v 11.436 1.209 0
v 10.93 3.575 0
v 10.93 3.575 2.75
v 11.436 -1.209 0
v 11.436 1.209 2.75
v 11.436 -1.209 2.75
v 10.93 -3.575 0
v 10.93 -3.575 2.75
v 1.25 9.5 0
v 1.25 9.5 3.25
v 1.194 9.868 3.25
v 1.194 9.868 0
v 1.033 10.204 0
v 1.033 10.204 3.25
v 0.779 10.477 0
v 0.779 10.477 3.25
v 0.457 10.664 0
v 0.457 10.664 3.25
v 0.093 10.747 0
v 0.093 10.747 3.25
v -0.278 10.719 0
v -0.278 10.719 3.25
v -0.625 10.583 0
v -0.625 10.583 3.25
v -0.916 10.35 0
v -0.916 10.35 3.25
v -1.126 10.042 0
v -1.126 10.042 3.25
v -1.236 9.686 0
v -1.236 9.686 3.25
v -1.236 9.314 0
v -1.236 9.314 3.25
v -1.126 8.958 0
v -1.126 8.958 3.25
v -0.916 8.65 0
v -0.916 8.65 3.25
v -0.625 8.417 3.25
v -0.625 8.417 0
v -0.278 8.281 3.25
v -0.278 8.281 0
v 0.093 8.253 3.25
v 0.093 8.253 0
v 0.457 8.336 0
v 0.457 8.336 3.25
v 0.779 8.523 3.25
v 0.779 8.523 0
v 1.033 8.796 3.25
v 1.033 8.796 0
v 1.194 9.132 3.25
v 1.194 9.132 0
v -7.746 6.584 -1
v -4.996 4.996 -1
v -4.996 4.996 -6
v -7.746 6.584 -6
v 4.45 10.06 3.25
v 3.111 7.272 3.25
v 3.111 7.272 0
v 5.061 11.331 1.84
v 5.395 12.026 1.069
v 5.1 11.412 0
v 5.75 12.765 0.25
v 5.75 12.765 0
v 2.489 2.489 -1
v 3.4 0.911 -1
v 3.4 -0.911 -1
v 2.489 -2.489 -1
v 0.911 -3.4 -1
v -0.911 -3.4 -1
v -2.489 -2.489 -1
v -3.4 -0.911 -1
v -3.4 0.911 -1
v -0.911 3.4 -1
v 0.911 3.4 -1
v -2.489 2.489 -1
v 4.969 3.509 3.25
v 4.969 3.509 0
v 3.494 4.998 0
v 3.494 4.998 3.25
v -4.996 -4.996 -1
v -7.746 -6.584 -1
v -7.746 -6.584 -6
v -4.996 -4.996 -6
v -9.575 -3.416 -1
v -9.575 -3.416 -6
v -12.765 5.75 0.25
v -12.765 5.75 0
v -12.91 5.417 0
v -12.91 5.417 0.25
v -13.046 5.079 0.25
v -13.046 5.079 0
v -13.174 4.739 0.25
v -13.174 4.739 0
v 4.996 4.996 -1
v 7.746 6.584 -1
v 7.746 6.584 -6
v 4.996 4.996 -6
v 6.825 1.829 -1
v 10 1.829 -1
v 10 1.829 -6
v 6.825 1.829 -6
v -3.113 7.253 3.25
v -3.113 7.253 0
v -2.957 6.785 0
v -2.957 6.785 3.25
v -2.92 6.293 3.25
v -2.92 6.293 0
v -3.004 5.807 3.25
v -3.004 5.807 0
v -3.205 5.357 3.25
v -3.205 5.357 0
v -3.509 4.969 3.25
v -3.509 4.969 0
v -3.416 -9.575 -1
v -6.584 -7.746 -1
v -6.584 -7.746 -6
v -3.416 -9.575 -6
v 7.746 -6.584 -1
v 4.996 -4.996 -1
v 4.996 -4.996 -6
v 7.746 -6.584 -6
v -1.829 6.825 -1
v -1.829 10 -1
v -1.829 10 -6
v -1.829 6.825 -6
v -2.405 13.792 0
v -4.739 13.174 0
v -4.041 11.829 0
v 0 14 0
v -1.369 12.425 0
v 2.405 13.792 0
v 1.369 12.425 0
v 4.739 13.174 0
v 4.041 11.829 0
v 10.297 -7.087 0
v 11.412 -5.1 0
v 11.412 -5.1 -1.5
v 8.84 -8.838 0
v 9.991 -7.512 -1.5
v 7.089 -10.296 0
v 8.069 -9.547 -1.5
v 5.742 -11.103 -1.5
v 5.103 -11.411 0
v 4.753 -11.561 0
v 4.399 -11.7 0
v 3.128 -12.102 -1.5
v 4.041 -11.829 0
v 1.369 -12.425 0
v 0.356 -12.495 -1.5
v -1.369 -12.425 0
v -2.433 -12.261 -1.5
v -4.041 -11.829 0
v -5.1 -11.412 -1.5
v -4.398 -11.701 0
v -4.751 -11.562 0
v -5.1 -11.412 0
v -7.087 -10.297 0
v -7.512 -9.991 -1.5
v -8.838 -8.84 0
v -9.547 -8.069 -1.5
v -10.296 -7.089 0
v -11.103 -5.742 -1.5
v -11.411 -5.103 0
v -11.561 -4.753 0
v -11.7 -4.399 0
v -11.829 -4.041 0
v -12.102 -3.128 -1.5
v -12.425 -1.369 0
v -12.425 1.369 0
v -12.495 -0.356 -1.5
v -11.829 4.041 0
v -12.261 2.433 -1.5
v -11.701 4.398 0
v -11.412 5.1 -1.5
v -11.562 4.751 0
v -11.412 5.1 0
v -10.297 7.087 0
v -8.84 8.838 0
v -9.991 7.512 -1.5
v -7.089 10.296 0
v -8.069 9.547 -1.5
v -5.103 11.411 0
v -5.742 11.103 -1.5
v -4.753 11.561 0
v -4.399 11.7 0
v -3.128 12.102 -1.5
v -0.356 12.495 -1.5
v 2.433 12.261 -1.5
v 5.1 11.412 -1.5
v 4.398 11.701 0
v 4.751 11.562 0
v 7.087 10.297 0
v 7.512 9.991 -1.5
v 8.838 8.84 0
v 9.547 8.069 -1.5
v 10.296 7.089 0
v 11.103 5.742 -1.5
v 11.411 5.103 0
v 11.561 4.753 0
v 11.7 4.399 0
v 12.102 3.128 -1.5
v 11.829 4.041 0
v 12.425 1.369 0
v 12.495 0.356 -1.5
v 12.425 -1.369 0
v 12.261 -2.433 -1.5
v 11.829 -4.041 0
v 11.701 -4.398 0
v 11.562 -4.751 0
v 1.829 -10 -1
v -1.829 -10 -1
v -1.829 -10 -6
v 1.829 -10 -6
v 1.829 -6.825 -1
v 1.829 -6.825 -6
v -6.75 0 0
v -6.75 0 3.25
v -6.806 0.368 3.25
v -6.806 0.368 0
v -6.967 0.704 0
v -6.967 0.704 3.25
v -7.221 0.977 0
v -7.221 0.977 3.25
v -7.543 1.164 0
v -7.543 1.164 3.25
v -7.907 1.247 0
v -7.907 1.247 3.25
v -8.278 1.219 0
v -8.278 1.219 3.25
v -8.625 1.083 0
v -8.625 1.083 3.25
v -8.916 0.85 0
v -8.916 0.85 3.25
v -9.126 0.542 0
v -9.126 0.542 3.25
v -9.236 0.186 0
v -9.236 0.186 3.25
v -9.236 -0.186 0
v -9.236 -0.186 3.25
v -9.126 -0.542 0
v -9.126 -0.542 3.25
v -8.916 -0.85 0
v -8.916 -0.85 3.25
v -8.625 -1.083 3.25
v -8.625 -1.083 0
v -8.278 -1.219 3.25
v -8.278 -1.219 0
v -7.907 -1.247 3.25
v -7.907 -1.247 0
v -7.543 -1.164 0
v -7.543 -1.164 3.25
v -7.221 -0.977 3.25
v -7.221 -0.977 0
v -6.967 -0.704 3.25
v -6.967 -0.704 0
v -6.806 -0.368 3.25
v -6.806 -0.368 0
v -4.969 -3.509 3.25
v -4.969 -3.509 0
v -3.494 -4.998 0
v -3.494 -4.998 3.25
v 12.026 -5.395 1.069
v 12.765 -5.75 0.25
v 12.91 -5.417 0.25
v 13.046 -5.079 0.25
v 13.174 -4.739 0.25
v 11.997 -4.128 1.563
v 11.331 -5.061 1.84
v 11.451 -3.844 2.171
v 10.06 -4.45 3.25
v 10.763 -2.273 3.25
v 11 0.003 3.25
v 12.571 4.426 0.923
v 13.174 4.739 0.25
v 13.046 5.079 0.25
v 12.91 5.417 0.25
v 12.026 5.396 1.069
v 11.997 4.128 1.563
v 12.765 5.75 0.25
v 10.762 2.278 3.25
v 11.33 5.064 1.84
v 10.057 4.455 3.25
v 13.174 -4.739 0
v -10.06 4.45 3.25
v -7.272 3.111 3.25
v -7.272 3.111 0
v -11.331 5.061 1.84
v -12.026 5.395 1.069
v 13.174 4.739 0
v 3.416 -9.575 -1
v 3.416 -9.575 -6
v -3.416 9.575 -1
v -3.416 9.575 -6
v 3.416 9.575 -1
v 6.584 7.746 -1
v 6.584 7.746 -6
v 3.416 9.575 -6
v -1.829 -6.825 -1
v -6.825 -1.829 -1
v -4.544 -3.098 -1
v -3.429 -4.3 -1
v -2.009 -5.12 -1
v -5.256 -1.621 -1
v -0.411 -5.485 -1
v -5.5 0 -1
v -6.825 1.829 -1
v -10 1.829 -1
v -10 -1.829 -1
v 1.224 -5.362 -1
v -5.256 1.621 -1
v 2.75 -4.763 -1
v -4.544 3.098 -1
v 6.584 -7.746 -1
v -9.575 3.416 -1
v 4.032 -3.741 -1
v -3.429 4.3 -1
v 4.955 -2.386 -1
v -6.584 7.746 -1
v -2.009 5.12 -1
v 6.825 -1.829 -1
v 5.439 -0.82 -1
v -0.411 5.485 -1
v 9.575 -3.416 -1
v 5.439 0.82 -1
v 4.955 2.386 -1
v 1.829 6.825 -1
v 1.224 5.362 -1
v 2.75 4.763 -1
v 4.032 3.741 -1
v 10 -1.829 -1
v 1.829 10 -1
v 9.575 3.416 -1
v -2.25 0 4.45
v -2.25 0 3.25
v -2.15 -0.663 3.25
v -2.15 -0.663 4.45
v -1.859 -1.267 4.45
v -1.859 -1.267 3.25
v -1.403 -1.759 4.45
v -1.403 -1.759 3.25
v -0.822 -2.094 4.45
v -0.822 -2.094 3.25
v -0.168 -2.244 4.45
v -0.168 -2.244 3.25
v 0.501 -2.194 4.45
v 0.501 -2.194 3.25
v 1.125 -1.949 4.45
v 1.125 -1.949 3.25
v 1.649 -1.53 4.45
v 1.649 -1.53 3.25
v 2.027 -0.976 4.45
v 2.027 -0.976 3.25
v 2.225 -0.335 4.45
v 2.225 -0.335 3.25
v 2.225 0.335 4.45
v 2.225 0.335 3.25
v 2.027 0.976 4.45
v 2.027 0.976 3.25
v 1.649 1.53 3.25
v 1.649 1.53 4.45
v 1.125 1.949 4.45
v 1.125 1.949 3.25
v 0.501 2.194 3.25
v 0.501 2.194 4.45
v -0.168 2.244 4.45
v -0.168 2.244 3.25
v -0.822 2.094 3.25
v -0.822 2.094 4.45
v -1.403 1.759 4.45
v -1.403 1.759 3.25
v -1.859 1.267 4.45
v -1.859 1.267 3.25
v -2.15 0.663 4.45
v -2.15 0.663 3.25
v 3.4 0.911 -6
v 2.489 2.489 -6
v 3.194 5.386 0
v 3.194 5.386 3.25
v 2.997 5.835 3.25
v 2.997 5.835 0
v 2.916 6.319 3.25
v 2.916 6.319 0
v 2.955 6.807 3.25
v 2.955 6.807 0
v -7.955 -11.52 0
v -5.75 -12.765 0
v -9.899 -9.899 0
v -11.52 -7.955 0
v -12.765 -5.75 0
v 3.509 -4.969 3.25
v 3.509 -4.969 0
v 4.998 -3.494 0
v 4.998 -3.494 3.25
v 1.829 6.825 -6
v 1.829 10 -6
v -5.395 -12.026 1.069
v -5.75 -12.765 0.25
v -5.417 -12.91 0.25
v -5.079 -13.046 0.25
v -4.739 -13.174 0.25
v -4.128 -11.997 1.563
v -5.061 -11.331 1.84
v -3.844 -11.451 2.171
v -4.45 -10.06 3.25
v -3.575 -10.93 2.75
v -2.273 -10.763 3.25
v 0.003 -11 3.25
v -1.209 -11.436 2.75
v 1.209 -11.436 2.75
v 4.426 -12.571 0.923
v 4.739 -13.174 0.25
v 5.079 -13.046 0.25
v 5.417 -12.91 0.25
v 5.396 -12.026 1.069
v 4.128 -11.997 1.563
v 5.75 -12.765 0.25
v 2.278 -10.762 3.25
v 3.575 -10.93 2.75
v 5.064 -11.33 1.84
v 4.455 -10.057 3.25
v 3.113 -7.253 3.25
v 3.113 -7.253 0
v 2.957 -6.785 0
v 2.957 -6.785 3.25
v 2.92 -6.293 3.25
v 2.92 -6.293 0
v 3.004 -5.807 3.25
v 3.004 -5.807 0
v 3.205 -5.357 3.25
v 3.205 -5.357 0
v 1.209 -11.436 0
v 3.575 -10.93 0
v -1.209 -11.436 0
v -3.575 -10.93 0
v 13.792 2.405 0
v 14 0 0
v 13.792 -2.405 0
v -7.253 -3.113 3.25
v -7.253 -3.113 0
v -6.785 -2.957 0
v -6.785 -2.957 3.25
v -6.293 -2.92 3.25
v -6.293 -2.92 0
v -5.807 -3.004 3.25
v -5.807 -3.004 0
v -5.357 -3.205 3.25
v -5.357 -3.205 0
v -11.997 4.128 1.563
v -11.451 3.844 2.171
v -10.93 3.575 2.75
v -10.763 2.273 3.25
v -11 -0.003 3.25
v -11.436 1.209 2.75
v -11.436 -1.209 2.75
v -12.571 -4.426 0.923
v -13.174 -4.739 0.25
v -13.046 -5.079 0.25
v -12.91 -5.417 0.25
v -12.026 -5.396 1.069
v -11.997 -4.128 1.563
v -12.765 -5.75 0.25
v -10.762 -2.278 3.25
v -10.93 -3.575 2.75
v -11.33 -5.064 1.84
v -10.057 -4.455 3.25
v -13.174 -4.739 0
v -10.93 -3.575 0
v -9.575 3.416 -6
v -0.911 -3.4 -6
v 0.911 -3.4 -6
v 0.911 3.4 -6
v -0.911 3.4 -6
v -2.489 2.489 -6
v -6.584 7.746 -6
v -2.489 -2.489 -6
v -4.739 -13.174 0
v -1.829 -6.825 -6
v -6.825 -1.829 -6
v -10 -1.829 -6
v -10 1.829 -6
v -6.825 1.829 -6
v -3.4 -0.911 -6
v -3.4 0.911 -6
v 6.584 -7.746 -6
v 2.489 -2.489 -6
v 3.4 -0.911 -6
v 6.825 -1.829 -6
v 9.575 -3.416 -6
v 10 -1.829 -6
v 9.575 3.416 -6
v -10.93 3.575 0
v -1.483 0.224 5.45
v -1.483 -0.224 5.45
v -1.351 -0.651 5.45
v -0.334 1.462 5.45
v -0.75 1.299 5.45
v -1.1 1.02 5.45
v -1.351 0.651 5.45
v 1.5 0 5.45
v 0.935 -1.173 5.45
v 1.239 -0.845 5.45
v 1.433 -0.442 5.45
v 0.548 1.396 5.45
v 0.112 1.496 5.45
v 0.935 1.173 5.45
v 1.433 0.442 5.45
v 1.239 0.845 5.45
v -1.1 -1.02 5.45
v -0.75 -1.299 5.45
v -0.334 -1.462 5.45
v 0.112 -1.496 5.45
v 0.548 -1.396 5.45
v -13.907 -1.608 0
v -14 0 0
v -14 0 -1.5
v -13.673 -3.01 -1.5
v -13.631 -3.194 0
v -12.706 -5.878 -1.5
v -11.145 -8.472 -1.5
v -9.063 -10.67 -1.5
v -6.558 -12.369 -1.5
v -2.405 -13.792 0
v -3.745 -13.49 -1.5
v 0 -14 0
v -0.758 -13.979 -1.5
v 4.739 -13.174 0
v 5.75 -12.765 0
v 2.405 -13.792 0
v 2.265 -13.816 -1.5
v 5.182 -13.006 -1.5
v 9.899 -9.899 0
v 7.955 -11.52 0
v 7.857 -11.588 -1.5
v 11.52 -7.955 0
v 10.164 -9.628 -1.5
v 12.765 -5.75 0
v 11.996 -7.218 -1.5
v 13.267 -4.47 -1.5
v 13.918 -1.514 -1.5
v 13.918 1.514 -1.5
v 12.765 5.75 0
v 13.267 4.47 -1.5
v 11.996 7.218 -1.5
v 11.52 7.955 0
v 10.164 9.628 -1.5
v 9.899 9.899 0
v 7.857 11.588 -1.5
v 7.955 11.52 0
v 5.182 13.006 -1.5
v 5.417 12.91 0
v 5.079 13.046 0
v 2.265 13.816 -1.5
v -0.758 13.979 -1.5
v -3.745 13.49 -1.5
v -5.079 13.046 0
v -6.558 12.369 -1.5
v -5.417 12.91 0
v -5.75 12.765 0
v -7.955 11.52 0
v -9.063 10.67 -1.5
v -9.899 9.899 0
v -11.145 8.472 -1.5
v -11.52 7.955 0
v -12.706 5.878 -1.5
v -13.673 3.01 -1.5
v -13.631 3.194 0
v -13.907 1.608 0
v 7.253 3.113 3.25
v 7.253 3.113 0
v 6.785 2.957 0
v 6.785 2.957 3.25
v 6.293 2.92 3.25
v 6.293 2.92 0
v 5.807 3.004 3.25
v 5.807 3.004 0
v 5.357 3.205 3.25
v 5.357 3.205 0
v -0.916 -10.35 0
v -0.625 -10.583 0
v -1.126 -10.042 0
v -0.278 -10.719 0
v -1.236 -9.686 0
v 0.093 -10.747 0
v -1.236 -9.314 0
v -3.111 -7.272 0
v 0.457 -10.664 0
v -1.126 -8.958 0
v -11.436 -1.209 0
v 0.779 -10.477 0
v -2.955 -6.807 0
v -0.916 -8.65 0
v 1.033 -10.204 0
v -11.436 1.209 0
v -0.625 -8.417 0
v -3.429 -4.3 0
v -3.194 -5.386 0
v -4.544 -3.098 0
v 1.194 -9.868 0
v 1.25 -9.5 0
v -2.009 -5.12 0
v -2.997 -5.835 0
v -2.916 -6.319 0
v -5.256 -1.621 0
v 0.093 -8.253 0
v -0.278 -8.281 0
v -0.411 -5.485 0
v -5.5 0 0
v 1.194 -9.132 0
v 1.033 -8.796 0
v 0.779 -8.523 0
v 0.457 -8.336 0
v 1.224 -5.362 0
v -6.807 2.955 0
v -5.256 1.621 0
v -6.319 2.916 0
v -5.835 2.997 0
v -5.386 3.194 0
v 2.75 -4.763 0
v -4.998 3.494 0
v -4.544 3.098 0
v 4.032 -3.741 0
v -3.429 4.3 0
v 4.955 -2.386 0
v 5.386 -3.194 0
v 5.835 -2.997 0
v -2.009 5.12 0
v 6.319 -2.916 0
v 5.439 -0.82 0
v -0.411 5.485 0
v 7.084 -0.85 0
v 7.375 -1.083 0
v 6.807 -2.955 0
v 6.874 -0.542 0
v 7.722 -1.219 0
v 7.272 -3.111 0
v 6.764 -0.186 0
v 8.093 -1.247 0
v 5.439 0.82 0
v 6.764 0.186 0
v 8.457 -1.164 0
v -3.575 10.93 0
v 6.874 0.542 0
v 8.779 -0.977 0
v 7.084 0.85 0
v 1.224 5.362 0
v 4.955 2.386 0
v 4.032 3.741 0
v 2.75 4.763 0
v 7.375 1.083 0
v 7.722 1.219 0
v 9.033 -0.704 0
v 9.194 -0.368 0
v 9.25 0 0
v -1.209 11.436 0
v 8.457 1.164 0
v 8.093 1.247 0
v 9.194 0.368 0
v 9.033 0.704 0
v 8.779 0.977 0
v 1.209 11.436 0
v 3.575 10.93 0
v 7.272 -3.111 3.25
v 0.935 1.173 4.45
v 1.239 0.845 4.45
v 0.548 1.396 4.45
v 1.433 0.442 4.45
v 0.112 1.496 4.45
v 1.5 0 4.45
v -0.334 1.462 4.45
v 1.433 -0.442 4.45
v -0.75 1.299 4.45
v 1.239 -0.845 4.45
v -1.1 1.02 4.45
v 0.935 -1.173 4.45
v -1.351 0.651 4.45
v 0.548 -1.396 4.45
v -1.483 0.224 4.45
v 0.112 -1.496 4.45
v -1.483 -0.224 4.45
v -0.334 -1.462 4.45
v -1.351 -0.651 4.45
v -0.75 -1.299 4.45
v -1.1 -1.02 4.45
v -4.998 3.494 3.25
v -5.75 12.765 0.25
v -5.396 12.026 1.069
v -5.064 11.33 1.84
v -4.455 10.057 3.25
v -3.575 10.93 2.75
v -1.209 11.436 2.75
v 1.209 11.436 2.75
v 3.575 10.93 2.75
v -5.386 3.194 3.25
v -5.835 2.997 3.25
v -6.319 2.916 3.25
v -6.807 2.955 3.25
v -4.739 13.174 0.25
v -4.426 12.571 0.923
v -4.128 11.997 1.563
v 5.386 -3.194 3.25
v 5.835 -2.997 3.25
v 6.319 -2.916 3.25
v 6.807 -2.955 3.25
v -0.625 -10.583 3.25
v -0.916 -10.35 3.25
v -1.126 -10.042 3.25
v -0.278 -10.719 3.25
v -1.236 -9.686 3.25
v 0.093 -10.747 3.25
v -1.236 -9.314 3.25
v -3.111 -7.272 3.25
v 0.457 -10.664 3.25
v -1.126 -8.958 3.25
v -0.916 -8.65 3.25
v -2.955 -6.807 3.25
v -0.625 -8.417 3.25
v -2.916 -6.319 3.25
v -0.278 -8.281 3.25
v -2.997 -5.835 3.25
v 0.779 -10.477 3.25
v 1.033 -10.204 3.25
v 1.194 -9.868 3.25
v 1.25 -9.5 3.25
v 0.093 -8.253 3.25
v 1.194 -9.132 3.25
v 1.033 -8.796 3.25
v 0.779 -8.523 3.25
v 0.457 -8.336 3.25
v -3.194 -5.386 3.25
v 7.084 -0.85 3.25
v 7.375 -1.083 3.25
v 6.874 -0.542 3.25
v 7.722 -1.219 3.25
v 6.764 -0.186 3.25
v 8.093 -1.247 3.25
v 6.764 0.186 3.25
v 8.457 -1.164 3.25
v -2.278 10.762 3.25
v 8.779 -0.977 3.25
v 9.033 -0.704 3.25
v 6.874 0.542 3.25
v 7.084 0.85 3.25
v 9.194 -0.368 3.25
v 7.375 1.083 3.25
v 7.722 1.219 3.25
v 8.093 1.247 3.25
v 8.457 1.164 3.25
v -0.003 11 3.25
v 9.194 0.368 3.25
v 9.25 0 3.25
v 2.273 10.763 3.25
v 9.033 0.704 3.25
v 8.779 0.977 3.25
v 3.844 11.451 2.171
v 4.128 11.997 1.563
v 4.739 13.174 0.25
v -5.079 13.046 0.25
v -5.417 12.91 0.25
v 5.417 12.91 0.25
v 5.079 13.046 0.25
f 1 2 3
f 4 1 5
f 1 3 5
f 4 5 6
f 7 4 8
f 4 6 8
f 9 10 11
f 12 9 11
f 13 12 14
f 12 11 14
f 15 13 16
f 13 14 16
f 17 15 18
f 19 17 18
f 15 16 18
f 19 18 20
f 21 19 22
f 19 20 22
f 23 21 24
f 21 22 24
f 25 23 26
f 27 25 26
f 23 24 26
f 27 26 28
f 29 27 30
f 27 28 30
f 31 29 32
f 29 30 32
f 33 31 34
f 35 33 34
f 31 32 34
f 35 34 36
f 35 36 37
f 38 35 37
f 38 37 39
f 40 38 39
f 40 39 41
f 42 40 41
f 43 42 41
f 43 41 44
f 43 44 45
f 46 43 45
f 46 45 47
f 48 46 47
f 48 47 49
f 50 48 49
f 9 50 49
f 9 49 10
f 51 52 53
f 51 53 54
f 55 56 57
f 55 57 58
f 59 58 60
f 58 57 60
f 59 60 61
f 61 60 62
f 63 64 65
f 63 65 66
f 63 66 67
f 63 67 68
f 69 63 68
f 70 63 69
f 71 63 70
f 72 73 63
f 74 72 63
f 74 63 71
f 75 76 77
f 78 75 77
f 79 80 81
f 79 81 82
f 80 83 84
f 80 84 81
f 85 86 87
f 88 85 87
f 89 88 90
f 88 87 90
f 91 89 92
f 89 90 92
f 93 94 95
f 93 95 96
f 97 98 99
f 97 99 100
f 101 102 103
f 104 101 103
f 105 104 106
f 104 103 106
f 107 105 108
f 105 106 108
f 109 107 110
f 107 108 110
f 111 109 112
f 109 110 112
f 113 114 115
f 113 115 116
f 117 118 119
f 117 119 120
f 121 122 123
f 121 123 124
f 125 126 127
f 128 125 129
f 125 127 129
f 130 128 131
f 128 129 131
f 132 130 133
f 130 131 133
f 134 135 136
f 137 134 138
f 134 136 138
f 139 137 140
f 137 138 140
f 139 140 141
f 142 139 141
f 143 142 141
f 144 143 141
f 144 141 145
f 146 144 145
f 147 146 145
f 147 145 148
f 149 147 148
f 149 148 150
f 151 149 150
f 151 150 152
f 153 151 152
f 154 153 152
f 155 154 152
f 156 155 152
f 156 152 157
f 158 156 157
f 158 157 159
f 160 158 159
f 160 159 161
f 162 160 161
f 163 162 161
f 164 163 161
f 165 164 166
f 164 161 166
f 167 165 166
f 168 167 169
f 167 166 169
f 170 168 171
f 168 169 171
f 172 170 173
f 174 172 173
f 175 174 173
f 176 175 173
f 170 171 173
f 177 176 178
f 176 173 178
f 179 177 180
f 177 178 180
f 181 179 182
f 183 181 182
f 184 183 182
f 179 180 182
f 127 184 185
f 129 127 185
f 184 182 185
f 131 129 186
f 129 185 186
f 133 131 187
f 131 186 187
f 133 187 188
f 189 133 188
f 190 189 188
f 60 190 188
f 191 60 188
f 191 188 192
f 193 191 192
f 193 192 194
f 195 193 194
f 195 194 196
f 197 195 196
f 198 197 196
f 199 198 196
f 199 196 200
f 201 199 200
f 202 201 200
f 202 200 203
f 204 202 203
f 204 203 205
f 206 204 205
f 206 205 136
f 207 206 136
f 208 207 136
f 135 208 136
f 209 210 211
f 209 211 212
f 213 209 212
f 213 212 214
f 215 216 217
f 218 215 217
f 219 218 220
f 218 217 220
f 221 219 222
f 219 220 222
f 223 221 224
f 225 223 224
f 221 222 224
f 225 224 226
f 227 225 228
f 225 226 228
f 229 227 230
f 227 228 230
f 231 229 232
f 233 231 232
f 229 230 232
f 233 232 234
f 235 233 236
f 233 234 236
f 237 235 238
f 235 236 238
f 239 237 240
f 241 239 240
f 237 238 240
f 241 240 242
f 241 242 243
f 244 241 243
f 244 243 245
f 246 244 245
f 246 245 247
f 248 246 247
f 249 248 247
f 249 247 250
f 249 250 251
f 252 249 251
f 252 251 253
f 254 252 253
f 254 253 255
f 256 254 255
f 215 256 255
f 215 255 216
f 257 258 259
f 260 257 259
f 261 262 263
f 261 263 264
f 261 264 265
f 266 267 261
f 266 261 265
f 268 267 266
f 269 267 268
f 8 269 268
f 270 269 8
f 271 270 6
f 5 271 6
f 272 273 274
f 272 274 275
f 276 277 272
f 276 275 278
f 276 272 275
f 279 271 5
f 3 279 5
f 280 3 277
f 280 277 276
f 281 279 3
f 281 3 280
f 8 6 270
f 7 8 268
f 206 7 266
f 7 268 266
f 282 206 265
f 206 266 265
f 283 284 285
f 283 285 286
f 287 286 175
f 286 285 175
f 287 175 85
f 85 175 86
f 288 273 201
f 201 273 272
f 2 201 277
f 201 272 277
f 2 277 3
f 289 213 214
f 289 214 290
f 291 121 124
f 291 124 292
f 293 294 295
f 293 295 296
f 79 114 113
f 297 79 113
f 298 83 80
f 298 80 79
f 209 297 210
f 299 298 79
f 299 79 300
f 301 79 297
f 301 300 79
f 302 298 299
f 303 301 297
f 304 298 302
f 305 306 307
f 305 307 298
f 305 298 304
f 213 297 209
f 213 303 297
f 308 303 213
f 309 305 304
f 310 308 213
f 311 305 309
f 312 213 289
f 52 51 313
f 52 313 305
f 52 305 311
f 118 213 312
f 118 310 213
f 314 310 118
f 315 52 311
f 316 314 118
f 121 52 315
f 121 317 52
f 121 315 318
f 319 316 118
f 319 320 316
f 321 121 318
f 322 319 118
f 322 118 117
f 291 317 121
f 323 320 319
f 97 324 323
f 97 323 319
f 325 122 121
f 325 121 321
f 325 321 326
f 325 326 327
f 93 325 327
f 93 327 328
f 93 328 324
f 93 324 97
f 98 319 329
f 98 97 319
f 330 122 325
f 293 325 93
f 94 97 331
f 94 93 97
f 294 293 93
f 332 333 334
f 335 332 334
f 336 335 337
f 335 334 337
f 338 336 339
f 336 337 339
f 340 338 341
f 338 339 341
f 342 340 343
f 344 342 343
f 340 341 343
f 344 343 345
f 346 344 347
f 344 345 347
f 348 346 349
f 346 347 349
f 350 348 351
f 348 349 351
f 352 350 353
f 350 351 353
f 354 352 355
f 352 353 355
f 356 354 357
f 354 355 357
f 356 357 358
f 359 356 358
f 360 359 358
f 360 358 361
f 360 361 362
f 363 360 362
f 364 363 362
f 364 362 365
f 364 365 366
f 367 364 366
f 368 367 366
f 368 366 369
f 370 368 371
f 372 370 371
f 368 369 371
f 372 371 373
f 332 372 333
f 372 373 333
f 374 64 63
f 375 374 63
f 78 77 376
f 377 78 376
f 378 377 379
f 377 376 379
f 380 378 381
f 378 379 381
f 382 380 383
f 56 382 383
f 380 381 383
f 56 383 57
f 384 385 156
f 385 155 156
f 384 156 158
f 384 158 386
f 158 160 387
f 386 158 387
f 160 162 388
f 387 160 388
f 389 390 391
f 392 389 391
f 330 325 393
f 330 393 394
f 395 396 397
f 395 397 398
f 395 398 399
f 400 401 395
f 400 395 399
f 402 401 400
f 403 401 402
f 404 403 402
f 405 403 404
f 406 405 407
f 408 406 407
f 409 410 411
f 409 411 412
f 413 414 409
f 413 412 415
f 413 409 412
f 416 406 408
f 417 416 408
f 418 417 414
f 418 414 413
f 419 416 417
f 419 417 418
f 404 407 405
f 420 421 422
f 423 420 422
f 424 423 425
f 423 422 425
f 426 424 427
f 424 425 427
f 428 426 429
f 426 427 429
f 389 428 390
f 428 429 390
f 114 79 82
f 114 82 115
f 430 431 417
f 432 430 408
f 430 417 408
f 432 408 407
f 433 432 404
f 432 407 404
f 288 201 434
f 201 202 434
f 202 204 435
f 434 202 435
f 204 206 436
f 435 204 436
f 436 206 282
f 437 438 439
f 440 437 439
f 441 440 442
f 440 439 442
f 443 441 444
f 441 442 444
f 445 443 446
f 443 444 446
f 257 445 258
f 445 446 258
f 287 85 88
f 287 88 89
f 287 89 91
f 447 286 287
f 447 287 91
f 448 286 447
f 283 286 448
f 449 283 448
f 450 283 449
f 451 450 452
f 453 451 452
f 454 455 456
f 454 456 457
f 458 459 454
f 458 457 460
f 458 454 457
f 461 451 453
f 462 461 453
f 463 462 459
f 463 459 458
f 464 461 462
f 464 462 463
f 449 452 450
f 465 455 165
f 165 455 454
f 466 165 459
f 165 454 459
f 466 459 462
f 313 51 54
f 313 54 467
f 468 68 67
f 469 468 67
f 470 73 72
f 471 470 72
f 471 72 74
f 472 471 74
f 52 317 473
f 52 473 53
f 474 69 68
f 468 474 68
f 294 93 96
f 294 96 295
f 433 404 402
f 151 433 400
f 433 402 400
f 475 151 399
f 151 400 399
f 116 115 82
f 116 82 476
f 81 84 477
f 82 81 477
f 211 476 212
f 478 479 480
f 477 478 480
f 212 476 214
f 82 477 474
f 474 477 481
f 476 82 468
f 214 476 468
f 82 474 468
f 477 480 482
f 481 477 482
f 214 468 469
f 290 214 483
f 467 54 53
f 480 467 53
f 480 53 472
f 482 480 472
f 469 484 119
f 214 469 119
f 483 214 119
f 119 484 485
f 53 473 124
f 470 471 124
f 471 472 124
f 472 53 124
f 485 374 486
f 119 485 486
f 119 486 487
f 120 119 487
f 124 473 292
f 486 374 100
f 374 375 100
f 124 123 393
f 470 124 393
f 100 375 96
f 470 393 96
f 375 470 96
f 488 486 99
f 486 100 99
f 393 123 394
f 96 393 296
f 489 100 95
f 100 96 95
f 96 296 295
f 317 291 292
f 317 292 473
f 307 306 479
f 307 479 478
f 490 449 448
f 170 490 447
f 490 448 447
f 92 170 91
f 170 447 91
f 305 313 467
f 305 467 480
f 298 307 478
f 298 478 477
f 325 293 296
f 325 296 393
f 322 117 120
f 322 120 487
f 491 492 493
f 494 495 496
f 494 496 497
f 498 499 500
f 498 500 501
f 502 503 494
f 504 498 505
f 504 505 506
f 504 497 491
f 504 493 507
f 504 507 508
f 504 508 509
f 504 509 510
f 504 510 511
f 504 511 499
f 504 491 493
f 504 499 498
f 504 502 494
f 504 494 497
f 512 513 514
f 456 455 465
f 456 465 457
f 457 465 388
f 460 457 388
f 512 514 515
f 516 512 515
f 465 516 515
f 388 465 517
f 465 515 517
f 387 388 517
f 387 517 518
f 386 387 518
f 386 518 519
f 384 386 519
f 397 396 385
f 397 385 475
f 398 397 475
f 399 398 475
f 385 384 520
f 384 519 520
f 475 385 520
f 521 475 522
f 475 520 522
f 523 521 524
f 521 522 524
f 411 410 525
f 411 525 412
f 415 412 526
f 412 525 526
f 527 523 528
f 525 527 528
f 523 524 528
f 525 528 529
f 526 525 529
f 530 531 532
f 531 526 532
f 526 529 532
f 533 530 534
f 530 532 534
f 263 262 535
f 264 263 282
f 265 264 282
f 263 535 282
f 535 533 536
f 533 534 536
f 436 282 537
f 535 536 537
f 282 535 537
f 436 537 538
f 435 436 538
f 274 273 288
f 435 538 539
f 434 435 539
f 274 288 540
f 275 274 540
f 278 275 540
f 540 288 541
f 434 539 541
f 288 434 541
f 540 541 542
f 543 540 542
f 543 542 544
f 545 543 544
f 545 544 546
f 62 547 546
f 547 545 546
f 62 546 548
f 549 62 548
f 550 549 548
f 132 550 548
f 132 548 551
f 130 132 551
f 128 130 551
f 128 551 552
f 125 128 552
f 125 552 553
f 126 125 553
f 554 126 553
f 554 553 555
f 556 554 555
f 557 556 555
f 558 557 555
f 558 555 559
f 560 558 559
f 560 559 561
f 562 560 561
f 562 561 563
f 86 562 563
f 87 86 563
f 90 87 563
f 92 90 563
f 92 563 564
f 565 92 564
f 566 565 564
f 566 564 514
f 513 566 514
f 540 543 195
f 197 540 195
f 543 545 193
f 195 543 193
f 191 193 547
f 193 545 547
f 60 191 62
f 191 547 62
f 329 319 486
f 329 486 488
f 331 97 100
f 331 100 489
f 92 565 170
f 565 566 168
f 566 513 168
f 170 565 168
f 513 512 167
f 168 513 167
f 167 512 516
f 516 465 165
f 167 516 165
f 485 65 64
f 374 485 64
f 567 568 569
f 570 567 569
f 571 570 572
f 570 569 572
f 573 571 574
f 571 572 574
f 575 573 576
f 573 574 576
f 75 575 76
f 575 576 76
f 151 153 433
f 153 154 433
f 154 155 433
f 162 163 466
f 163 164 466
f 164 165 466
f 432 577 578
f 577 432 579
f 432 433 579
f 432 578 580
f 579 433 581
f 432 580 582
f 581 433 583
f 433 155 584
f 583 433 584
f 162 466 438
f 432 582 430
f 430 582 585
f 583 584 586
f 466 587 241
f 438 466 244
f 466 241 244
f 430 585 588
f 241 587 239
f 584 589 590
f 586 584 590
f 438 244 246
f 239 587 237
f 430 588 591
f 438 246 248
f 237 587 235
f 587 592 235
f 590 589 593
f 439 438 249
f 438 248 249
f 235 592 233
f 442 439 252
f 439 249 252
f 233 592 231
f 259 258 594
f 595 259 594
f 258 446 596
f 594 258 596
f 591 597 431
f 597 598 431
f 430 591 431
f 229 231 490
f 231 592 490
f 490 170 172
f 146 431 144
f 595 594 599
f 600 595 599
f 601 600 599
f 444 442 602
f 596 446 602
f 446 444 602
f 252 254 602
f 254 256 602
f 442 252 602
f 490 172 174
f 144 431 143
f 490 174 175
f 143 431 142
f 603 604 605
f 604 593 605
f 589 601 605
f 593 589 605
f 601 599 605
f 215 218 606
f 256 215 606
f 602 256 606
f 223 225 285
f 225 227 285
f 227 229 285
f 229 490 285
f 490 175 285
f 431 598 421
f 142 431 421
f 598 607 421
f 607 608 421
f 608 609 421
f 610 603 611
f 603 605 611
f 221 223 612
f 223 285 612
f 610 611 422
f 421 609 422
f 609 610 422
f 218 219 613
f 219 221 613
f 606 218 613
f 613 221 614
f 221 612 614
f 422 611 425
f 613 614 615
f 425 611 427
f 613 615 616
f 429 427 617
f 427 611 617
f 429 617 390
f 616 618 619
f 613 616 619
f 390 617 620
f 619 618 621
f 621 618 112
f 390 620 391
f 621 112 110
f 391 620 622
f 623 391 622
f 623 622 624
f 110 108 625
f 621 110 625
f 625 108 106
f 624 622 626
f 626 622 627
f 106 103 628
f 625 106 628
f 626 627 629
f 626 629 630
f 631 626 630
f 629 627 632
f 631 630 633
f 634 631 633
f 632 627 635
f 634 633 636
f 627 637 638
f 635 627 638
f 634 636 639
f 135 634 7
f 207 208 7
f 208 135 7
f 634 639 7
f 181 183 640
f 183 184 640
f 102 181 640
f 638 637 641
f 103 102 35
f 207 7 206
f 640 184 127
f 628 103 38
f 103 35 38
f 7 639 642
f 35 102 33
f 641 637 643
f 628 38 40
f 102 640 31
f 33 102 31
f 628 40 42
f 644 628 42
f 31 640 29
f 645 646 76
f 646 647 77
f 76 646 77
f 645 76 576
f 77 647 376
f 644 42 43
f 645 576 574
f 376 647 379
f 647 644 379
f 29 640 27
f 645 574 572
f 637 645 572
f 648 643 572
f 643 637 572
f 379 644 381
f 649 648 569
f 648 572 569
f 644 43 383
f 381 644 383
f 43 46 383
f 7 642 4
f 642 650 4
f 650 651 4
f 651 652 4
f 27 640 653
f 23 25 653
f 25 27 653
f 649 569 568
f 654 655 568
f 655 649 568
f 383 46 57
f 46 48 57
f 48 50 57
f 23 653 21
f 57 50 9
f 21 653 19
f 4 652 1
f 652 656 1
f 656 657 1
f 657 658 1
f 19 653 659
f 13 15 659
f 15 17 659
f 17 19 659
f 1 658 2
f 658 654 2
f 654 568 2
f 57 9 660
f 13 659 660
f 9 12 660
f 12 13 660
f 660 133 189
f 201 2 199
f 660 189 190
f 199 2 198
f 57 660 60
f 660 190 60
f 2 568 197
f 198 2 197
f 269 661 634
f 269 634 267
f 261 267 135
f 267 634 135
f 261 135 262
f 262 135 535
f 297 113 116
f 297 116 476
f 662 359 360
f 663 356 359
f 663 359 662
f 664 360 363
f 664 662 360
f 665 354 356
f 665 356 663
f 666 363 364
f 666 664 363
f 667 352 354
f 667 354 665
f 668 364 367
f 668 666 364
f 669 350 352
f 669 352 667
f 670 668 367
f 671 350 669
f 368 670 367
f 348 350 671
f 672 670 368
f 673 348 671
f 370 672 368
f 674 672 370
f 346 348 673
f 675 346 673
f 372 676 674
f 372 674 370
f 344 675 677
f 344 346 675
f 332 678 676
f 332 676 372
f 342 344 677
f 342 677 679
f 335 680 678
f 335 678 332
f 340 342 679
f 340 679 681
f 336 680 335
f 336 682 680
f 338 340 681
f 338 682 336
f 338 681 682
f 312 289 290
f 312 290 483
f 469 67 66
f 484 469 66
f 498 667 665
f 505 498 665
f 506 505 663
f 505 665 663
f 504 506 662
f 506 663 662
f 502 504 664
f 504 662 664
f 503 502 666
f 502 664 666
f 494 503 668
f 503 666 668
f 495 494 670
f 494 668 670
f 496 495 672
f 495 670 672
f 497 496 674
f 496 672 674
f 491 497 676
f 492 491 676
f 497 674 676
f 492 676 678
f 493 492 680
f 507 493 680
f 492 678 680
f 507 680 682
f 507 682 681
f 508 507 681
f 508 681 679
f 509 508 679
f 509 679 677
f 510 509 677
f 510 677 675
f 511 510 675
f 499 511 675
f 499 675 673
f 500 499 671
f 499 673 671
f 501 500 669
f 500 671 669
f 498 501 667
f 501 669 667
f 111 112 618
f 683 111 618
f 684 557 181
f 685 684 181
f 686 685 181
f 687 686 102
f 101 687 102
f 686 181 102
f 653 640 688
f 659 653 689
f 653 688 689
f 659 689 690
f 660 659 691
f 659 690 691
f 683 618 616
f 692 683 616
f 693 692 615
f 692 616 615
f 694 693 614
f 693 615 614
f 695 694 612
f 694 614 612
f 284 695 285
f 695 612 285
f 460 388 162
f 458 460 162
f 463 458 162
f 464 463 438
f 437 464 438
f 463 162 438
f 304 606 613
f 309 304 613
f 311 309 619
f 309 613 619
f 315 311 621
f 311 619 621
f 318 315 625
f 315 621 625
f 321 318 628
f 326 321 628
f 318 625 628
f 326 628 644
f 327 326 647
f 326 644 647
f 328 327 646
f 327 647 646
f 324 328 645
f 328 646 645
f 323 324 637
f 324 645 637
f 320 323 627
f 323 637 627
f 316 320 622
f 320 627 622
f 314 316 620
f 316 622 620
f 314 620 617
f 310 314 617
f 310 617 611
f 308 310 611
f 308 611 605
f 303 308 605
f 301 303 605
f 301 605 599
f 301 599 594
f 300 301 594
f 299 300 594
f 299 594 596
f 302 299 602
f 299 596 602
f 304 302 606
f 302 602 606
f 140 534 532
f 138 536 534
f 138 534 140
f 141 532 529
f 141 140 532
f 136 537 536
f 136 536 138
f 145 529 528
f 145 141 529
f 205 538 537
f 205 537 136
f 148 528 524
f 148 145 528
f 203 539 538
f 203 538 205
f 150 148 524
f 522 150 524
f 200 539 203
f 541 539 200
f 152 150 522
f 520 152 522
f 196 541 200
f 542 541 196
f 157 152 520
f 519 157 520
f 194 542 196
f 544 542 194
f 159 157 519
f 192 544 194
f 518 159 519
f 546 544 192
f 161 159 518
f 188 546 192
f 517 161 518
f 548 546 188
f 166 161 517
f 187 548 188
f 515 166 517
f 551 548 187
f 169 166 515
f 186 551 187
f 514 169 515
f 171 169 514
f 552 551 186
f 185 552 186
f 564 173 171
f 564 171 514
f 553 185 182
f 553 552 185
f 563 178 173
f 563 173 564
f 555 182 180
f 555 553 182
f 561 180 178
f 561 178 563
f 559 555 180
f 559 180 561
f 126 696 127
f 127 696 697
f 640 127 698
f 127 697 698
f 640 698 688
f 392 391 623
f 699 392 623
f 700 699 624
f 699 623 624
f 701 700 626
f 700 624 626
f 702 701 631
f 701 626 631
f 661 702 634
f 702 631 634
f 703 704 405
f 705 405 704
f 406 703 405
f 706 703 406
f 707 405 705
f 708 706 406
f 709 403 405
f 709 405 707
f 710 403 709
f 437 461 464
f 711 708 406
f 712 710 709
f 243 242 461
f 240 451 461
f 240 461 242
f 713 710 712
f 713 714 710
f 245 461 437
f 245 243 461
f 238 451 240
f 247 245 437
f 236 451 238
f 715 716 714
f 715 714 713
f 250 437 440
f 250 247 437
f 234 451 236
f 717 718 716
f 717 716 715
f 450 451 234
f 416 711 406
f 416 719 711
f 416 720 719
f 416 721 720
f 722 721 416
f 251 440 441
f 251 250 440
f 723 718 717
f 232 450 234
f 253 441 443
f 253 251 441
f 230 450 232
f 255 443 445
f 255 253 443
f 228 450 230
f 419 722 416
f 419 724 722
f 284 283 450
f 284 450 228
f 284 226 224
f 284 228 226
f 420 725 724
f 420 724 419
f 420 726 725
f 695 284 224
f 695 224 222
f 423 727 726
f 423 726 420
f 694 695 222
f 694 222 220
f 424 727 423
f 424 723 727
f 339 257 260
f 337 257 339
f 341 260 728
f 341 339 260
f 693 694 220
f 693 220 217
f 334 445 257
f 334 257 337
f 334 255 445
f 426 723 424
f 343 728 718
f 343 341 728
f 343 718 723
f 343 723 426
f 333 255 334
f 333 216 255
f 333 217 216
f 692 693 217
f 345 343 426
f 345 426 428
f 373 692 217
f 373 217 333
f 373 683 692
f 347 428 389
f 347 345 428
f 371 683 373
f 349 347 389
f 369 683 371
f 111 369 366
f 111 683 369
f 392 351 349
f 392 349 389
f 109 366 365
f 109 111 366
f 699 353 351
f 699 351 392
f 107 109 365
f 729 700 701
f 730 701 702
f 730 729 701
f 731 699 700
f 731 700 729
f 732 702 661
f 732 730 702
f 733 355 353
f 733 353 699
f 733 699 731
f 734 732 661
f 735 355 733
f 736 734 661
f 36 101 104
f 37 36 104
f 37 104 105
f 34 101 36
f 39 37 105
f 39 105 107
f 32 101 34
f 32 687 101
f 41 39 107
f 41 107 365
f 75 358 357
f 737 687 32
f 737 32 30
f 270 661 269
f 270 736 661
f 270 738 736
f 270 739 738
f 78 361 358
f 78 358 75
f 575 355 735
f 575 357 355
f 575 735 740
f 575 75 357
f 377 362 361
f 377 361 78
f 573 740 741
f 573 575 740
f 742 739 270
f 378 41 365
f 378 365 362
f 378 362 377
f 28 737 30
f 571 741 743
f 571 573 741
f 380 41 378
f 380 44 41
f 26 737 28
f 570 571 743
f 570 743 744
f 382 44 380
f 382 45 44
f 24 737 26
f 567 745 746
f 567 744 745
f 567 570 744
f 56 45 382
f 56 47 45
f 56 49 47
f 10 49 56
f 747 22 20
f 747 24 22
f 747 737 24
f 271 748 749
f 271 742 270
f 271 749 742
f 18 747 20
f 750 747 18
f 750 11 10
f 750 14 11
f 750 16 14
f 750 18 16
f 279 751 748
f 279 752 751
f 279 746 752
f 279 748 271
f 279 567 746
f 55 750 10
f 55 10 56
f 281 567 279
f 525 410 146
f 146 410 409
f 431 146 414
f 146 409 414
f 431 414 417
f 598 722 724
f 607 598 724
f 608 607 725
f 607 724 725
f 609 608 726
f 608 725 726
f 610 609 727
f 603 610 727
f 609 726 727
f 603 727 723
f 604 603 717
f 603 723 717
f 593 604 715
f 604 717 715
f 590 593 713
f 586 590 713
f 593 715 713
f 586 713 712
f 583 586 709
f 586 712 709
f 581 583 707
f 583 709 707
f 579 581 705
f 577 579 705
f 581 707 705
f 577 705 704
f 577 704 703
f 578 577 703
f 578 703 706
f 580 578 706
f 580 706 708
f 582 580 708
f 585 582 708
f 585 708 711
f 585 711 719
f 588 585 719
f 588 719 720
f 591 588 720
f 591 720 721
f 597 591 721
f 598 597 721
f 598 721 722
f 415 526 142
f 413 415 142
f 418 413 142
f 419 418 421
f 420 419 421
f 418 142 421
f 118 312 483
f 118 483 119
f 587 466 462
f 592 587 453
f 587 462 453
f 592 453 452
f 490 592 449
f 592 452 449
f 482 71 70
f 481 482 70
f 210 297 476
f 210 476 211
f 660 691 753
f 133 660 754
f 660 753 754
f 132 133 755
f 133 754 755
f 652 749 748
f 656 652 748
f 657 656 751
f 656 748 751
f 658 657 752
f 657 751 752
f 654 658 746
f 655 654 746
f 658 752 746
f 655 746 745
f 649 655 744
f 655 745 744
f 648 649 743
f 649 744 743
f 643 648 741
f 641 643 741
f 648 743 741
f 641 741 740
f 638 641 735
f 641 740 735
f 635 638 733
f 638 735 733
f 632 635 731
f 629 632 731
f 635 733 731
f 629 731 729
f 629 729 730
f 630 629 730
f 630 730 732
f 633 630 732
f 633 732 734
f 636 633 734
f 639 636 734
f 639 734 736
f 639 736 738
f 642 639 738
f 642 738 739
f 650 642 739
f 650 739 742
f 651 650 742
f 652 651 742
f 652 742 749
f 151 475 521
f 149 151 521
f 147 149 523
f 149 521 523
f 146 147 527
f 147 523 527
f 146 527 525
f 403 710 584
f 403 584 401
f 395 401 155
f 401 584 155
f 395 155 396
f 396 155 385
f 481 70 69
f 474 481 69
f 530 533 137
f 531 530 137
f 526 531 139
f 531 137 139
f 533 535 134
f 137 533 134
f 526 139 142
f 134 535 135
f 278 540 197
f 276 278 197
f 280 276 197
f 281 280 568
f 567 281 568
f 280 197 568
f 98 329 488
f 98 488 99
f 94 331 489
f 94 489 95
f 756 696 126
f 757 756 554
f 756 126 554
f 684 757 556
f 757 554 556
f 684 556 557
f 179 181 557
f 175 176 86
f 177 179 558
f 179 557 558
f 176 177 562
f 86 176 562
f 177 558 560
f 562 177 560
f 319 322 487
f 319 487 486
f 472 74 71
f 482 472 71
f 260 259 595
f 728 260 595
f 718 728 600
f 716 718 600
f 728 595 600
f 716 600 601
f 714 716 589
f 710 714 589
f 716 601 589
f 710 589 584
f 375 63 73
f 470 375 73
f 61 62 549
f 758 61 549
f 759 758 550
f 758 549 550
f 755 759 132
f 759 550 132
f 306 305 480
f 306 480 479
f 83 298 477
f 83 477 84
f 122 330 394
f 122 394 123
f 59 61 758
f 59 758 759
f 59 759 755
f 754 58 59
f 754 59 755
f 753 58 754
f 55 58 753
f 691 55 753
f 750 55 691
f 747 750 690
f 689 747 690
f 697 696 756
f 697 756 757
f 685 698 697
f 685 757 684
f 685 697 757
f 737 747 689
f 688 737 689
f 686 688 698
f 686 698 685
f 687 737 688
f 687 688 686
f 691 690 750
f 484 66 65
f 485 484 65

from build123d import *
from build123d.topology import SkipClean

# Parameters (mm, degrees)
EXTRUDE_1_DEPTH     = 3.25
EXTRUDE_START       = 1.5
SKETCH_2_R          = 14.000000000000027
SKETCH_2_R_2        = 12.499999999999906
EXTRUDE_2_DEPTH     = 1.5
CHAMFER_1_SIZE      = 3
CUT_EXTRUDE_2_REACH = 22.361
SKETCH_3_R          = 1.2500000000000002
SKETCH_3_R_2        = 1.2499999999999991
SKETCH_3_R_3        = 1.2499999999999998
SKETCH_3_R_4        = 1.250000000000001
SKETCH_4_R          = 2.25
EXTRUDE_3_DEPTH     = 1.2
SKETCH_6_R          = 1.5
EXTRUDE_4_DEPTH     = 1
SKETCH_7_R          = 5.5
EXTRUDE_5_DEPTH     = 1
EXTRUDE_6_DEPTH     = 5


with BuildPart() as part:
    # Эскиз1 → Бобышка-Вытянуть1 (new body)
    with BuildSketch(Plane.XY):
        with BuildLine():
            Line((-7.272076584167655, 3.111154183095137), (-12.764697411219743, 5.749999999999998))
            ThreePointArc((-12.764697411219743, 5.749999999999998), (-13.687690889209106, 2.9405982591067765), (-13.999999999999988, 0))
            ThreePointArc((-13.999999999999988, 0), (-13.68769088920912, -2.9405982591067032), (-12.764697411219801, -5.749999999999867))
            Line((-12.764697411219801, -5.749999999999867), (-7.25261222668815, -3.113400385794882))
            ThreePointArc((-7.25261222668815, -3.113400385794882), (-6.047780294633424, -2.947046212491201), (-4.969360809785696, -3.5094563032390873))
            Line((-4.969360809785696, -3.5094563032390873), (-3.493656572586229, -4.997814070292929))
            ThreePointArc((-3.493656572586229, -4.997814070292929), (-2.9415951503787445, -6.074261578843696), (-3.111154183095193, -7.272076584167621))
            Line((-3.111154183095193, -7.272076584167621), (-5.75000000000013, -12.764697411219682))
            ThreePointArc((-5.75000000000013, -12.764697411219682), (-2.940598259106871, -13.687690889209117), (-4.974e-14, -14.00000000000005))
            ThreePointArc((-4.974e-14, -14.00000000000005), (2.940598259106699, -13.687690889209104), (5.74999999999991, -12.764697411219782))
            Line((5.74999999999991, -12.764697411219782), (3.113400385794907, -7.252612226688141))
            ThreePointArc((3.113400385794907, -7.252612226688141), (2.9470462124912205, -6.047780294633415), (3.509456303239104, -4.969360809785686))
            Line((3.509456303239104, -4.969360809785686), (4.99781407029294, -3.493656572586213))
            ThreePointArc((4.99781407029294, -3.493656572586213), (6.074261578843707, -2.941595150378726), (7.272076584167633, -3.1111541830951692))
            Line((7.272076584167633, -3.1111541830951692), (12.764697411219702, -5.750000000000088))
            ThreePointArc((12.764697411219702, -5.750000000000088), (13.687690889209112, -2.9405982591068236), (14.00000000000005, 8.8e-16))
            ThreePointArc((14.00000000000005, 8.8e-16), (13.687690889209128, 2.9405982591067543), (12.764697411219764, 5.749999999999957))
            Line((12.764697411219764, 5.749999999999957), (7.2526122266881305, 3.113400385794934))
            ThreePointArc((7.2526122266881305, 3.113400385794934), (6.047780294633405, 2.9470462124912435), (4.969360809785673, 3.5094563032391233))
            Line((4.969360809785673, 3.5094563032391233), (3.493656572586196, 4.9978140702929545))
            ThreePointArc((3.493656572586196, 4.9978140702929545), (2.9415951503787046, 6.074261578843718), (3.111154183095144, 7.272076584167644))
            Line((3.111154183095144, 7.272076584167644), (5.750000000000043, 12.764697411219723))
            ThreePointArc((5.750000000000043, 12.764697411219723), (2.940598259106772, 13.68769088920909), (-4.802e-14, 14.00000000000005))
            ThreePointArc((-4.802e-14, 14.00000000000005), (-2.940598259106804, 13.687690889209133), (-5.75, 12.764697411219743))
            Line((-5.75, 12.764697411219743), (-3.113400385794959, 7.252612226688119))
            ThreePointArc((-3.113400385794959, 7.252612226688119), (-2.947046212491262, 6.047780294633395), (-3.5094563032391375, 4.969360809785661))
            Line((-3.5094563032391375, 4.969360809785661), (-4.997814070292954, 3.4936565725861874))
            ThreePointArc((-4.997814070292954, 3.4936565725861874), (-6.074261578843724, 2.941595150378682), (-7.272076584167655, 3.111154183095137))
        make_face()
    extrude(amount=EXTRUDE_1_DEPTH)

    # Эскиз2 → Бобышка-Вытянуть2 (add)
    with SkipClean():  # the faces are left unmerged after this step: merging them gives an invalid solid
        with BuildSketch(Plane(origin=(0, 0, 0), x_dir=(-1, 0, 0), z_dir=(0, 0, -1)).offset(EXTRUDE_START)):
            Circle(SKETCH_2_R)
            with Locations(Location((0, 0, 0), (0, 0, 204.080288301))):
                Circle(SKETCH_2_R_2, mode=Mode.SUBTRACT)
        extrude(amount=-EXTRUDE_2_DEPTH)

    # Фаска1
    chamfer_1_edges = [part.edges().sort_by_distance(p)[0] for p in [
        (-1.7286e-13, -14.000000000000046, 3.25),
        (-13.999999999999986, 7.35e-14, 3.25),
        (14.00000000000005, -9.981e-14, 3.25),
        (3.486e-14, 14.00000000000005, 3.25),
    ]]
    chamfer(chamfer_1_edges, length=CHAMFER_1_SIZE)

    # Вырез-Вытянуть2: up to this face of the body (flat: up to its plane)
    cut_extrude_2_end = Plane(part.part.faces().sort_by_distance((0, 0, 0))[0])
    # Эскиз3 → Вырез-Вытянуть2 (cut, up to the picked face)
    with BuildSketch(Plane.XY.offset(3.25), mode=Mode.PRIVATE) as cut_extrude_2_sk1:
        with Locations((-8, 0)):
            Circle(SKETCH_3_R)
    cut_extrude_2_tool1 = split(extrude(cut_extrude_2_sk1.sketch, amount=-CUT_EXTRUDE_2_REACH, mode=Mode.PRIVATE), bisect_by=cut_extrude_2_end, keep=Keep.BOTH, mode=Mode.PRIVATE)
    # Эскиз3 → Вырез-Вытянуть2 (cut, up to the picked face)
    with BuildSketch(Plane.XY.offset(3.25), mode=Mode.PRIVATE) as cut_extrude_2_sk2:
        with Locations((8, 0)):
            Circle(SKETCH_3_R_2)
    cut_extrude_2_tool2 = split(extrude(cut_extrude_2_sk2.sketch, amount=-CUT_EXTRUDE_2_REACH, mode=Mode.PRIVATE), bisect_by=cut_extrude_2_end, keep=Keep.BOTH, mode=Mode.PRIVATE)
    # Эскиз3 → Вырез-Вытянуть2 (cut, up to the picked face)
    with BuildSketch(Plane.XY.offset(3.25), mode=Mode.PRIVATE) as cut_extrude_2_sk3:
        with Locations((0, 9.5)):
            Circle(SKETCH_3_R_3)
    cut_extrude_2_tool3 = split(extrude(cut_extrude_2_sk3.sketch, amount=-CUT_EXTRUDE_2_REACH, mode=Mode.PRIVATE), bisect_by=cut_extrude_2_end, keep=Keep.BOTH, mode=Mode.PRIVATE)
    # Эскиз3 → Вырез-Вытянуть2 (cut, up to the picked face)
    with BuildSketch(Plane.XY.offset(3.25), mode=Mode.PRIVATE) as cut_extrude_2_sk4:
        with Locations((0, -9.5)):
            Circle(SKETCH_3_R_4)
    cut_extrude_2_tool4 = split(extrude(cut_extrude_2_sk4.sketch, amount=-CUT_EXTRUDE_2_REACH, mode=Mode.PRIVATE), bisect_by=cut_extrude_2_end, keep=Keep.BOTH, mode=Mode.PRIVATE)
    # Эскиз3 → Вырез-Вытянуть2 (cut, up to the picked face)
    with BuildSketch(Plane.XY.offset(3.25), mode=Mode.PRIVATE) as cut_extrude_2_sk5:
        with BuildLine():
            Line((-4.738786646254797, 13.173606230690137), (-3.574525297896844, 10.930359961808032))
            ThreePointArc((-3.574525297896844, 10.930359961808032), (7e-16, 11.500000000000027), (3.574525297896844, 10.930359961808032))
            Line((3.574525297896844, 10.930359961808032), (4.738786646254797, 13.173606230690137))
            ThreePointArc((4.738786646254797, 13.173606230690137), (8.6e-16, 14.000000000000028), (-4.738786646254797, 13.173606230690137))
        make_face()
    cut_extrude_2_tool5 = split(extrude(cut_extrude_2_sk5.sketch, amount=-CUT_EXTRUDE_2_REACH, mode=Mode.PRIVATE), bisect_by=cut_extrude_2_end, keep=Keep.BOTH, mode=Mode.PRIVATE)
    # Эскиз3 → Вырез-Вытянуть2 (cut, up to the picked face)
    with BuildSketch(Plane.XY.offset(3.25), mode=Mode.PRIVATE) as cut_extrude_2_sk6:
        with BuildLine():
            Line((13.173606230690154, 4.738786646254751), (10.930359961808044, 3.574525297896806))
            ThreePointArc((10.930359961808044, 3.574525297896806), (11.500000000000027, -4.022e-14), (10.93035996180802, -3.5745252978968822))
            Line((10.93035996180802, -3.5745252978968822), (13.173606230690119, -4.738786646254843))
            ThreePointArc((13.173606230690119, -4.738786646254843), (14.000000000000027, -4.896e-14), (13.173606230690154, 4.738786646254751))
        make_face()
    cut_extrude_2_tool6 = split(extrude(cut_extrude_2_sk6.sketch, amount=-CUT_EXTRUDE_2_REACH, mode=Mode.PRIVATE), bisect_by=cut_extrude_2_end, keep=Keep.BOTH, mode=Mode.PRIVATE)
    # Эскиз3 → Вырез-Вытянуть2 (cut, up to the picked face)
    with BuildSketch(Plane.XY.offset(3.25), mode=Mode.PRIVATE) as cut_extrude_2_sk7:
        with BuildLine():
            Line((4.738786646254705, -13.173606230690169), (3.5745252978967677, -10.930359961808056))
            ThreePointArc((3.5745252978967677, -10.930359961808056), (-8.101e-14, -11.500000000000027), (-3.5745252978969204, -10.930359961808007))
            Line((-3.5745252978969204, -10.930359961808007), (-4.738786646254889, -13.173606230690103))
            ThreePointArc((-4.738786646254889, -13.173606230690103), (-9.862e-14, -14.000000000000027), (4.738786646254705, -13.173606230690169))
        make_face()
    cut_extrude_2_tool7 = split(extrude(cut_extrude_2_sk7.sketch, amount=-CUT_EXTRUDE_2_REACH, mode=Mode.PRIVATE), bisect_by=cut_extrude_2_end, keep=Keep.BOTH, mode=Mode.PRIVATE)
    # Эскиз3 → Вырез-Вытянуть2 (cut, up to the picked face)
    with BuildSketch(Plane.XY.offset(3.25), mode=Mode.PRIVATE) as cut_extrude_2_sk8:
        with BuildLine():
            Line((-13.173606230690186, -4.738786646254658), (-10.930359961808069, -3.574525297896729))
            ThreePointArc((-10.930359961808069, -3.574525297896729), (-11.500000000000025, 1.2116e-13), (-10.930359961807993, 3.5745252978969595))
            Line((-10.930359961807993, 3.5745252978969595), (-13.173606230690085, 4.738786646254936))
            ThreePointArc((-13.173606230690085, 4.738786646254936), (-14.000000000000027, 1.5093e-13), (-13.173606230690186, -4.738786646254658))
        make_face()
    cut_extrude_2_tool8 = split(extrude(cut_extrude_2_sk8.sketch, amount=-CUT_EXTRUDE_2_REACH, mode=Mode.PRIVATE), bisect_by=cut_extrude_2_end, keep=Keep.BOTH, mode=Mode.PRIVATE)
    add(cut_extrude_2_tool1.solids().sort_by(Axis((-8, 0, 3.25), (0, 0, -1)))[0], mode=Mode.SUBTRACT)
    add(cut_extrude_2_tool2.solids().sort_by(Axis((8, 0, 3.25), (0, 0, -1)))[0], mode=Mode.SUBTRACT)
    add(cut_extrude_2_tool3.solids().sort_by(Axis((0, 9.5, 3.25), (0, 0, -1)))[0], mode=Mode.SUBTRACT)
    add(cut_extrude_2_tool4.solids().sort_by(Axis((0, -9.5, 3.25), (0, 0, -1)))[0], mode=Mode.SUBTRACT)
    add(cut_extrude_2_tool5.solids().sort_by(Axis((0, 12.573718, 3.25), (0, 0, -1)))[0], mode=Mode.SUBTRACT)
    add(cut_extrude_2_tool6.solids().sort_by(Axis((12.573718, 0, 3.25), (0, 0, -1)))[0], mode=Mode.SUBTRACT)
    add(cut_extrude_2_tool7.solids().sort_by(Axis((0, -12.573718, 3.25), (0, 0, -1)))[0], mode=Mode.SUBTRACT)
    add(cut_extrude_2_tool8.solids().sort_by(Axis((-12.573718, 0, 3.25), (0, 0, -1)))[0], mode=Mode.SUBTRACT)

    # Эскиз4 → Бобышка-Вытянуть3 (add)
    with SkipClean():  # the faces are left unmerged after this step: merging them gives an invalid solid
        with BuildSketch(Plane.XY.offset(3.25)):
            with Locations(Location((0, 0, 0), (0, 0, 180))):
                Circle(SKETCH_4_R)
        extrude(amount=EXTRUDE_3_DEPTH)

    # Эскиз6 → Бобышка-Вытянуть4 (add)
    with SkipClean():  # the faces are left unmerged after this step: merging them gives an invalid solid
        with BuildSketch(Plane.XY.offset(4.45)):
            Circle(SKETCH_6_R)
        extrude(amount=EXTRUDE_4_DEPTH)

    # Эскиз7 → Бобышка-Вытянуть5 (add)
    with SkipClean():  # the faces are left unmerged after this step: merging them gives an invalid solid
        with BuildSketch(Plane(origin=(0, 0, 0), x_dir=(-1, 0, 0), z_dir=(0, 0, -1))):
            Circle(SKETCH_7_R)
        extrude(amount=EXTRUDE_5_DEPTH)

    # Эскиз8 → Бобышка-Вытянуть6 (add)
    with SkipClean():  # the faces are left unmerged after this step: merging them gives an invalid solid
        with BuildSketch(Plane(origin=(0, 0, -1), x_dir=(-1, 0, 0), z_dir=(0, 0, -1))):
            Polygon((-1.8286367370263235, 9.999999999999904), (1.8286367370263235, 9.999999999999904), (1.8286367370263241, 6.824565211169193), (3.4163541314416523, 9.57457240635755), (6.5836458685582135, 7.745935669331226), (4.995928474142883, 4.995928474142866), (7.745935669331147, 6.583645868558398), (9.57457240635747, 3.4163541314418384), (6.8245652111691975, 1.8286367370262993), (9.999999999999972, 1.8286367370265468), (9.999999999999972, -1.8286367370261), (6.824565211169186, -1.828636737026348), (9.574572406357618, -3.416354131441428), (7.745935669331295, -6.58364586855799), (4.995928474142845, -4.995928474142898), (6.5836458685584685, -7.745935669330923), (3.416354131441909, -9.574572406357246), (1.828636737026489, -6.824565211169578), (1.8286367370266157, -9.99999999999975), (-1.8286367370260312, -9.99999999999975), (-1.828636737026372, -6.824565211169182), (-3.416354131441359, -9.574572406357396), (-6.5836458685579204, -7.745935669331072), (-4.995928474142918, -4.995928474142831), (-7.745935669330854, -6.583645868558247), (-9.574572406357179, -3.416354131441687), (-6.824565211169213, -1.8286367370262528), (-9.999999999999682, -1.8286367370263936), (-9.999999999999682, 1.8286367370262533), (-6.824565211169262, 1.828636737026395), (-9.57457240635733, 3.4163541314415777), (-7.745935669331009, 6.583645868558139), (-4.995928474142862, 4.995928474142964), (-6.583645868558178, 7.745935669331077), (-3.4163541314416186, 9.574572406357401), (-1.828636737026324, 6.824565211169384), align=None)
            Polygon((-0.9110272542657695, 3.3999999999999058), (0.9110272542657935, 3.3999999999999058), (2.488972745734119, 2.48897274573411), (3.3999999999999093, 0.9110272542657816), (3.3999999999999027, -0.9110272542658054), (2.488972745734102, -2.4889727457341264), (0.9110272542657677, -3.3999999999999124), (-0.9110272542658163, -3.3999999999999004), (-2.4889727457341366, -2.4889727457340918), (-3.399999999999915, -0.9110272542657586), (-3.399999999999896, 0.9110272542658285), (-2.4889727457341553, 2.488972745734021), align=None, mode=Mode.SUBTRACT)
        extrude(amount=EXTRUDE_6_DEPTH)


solid = part.part
